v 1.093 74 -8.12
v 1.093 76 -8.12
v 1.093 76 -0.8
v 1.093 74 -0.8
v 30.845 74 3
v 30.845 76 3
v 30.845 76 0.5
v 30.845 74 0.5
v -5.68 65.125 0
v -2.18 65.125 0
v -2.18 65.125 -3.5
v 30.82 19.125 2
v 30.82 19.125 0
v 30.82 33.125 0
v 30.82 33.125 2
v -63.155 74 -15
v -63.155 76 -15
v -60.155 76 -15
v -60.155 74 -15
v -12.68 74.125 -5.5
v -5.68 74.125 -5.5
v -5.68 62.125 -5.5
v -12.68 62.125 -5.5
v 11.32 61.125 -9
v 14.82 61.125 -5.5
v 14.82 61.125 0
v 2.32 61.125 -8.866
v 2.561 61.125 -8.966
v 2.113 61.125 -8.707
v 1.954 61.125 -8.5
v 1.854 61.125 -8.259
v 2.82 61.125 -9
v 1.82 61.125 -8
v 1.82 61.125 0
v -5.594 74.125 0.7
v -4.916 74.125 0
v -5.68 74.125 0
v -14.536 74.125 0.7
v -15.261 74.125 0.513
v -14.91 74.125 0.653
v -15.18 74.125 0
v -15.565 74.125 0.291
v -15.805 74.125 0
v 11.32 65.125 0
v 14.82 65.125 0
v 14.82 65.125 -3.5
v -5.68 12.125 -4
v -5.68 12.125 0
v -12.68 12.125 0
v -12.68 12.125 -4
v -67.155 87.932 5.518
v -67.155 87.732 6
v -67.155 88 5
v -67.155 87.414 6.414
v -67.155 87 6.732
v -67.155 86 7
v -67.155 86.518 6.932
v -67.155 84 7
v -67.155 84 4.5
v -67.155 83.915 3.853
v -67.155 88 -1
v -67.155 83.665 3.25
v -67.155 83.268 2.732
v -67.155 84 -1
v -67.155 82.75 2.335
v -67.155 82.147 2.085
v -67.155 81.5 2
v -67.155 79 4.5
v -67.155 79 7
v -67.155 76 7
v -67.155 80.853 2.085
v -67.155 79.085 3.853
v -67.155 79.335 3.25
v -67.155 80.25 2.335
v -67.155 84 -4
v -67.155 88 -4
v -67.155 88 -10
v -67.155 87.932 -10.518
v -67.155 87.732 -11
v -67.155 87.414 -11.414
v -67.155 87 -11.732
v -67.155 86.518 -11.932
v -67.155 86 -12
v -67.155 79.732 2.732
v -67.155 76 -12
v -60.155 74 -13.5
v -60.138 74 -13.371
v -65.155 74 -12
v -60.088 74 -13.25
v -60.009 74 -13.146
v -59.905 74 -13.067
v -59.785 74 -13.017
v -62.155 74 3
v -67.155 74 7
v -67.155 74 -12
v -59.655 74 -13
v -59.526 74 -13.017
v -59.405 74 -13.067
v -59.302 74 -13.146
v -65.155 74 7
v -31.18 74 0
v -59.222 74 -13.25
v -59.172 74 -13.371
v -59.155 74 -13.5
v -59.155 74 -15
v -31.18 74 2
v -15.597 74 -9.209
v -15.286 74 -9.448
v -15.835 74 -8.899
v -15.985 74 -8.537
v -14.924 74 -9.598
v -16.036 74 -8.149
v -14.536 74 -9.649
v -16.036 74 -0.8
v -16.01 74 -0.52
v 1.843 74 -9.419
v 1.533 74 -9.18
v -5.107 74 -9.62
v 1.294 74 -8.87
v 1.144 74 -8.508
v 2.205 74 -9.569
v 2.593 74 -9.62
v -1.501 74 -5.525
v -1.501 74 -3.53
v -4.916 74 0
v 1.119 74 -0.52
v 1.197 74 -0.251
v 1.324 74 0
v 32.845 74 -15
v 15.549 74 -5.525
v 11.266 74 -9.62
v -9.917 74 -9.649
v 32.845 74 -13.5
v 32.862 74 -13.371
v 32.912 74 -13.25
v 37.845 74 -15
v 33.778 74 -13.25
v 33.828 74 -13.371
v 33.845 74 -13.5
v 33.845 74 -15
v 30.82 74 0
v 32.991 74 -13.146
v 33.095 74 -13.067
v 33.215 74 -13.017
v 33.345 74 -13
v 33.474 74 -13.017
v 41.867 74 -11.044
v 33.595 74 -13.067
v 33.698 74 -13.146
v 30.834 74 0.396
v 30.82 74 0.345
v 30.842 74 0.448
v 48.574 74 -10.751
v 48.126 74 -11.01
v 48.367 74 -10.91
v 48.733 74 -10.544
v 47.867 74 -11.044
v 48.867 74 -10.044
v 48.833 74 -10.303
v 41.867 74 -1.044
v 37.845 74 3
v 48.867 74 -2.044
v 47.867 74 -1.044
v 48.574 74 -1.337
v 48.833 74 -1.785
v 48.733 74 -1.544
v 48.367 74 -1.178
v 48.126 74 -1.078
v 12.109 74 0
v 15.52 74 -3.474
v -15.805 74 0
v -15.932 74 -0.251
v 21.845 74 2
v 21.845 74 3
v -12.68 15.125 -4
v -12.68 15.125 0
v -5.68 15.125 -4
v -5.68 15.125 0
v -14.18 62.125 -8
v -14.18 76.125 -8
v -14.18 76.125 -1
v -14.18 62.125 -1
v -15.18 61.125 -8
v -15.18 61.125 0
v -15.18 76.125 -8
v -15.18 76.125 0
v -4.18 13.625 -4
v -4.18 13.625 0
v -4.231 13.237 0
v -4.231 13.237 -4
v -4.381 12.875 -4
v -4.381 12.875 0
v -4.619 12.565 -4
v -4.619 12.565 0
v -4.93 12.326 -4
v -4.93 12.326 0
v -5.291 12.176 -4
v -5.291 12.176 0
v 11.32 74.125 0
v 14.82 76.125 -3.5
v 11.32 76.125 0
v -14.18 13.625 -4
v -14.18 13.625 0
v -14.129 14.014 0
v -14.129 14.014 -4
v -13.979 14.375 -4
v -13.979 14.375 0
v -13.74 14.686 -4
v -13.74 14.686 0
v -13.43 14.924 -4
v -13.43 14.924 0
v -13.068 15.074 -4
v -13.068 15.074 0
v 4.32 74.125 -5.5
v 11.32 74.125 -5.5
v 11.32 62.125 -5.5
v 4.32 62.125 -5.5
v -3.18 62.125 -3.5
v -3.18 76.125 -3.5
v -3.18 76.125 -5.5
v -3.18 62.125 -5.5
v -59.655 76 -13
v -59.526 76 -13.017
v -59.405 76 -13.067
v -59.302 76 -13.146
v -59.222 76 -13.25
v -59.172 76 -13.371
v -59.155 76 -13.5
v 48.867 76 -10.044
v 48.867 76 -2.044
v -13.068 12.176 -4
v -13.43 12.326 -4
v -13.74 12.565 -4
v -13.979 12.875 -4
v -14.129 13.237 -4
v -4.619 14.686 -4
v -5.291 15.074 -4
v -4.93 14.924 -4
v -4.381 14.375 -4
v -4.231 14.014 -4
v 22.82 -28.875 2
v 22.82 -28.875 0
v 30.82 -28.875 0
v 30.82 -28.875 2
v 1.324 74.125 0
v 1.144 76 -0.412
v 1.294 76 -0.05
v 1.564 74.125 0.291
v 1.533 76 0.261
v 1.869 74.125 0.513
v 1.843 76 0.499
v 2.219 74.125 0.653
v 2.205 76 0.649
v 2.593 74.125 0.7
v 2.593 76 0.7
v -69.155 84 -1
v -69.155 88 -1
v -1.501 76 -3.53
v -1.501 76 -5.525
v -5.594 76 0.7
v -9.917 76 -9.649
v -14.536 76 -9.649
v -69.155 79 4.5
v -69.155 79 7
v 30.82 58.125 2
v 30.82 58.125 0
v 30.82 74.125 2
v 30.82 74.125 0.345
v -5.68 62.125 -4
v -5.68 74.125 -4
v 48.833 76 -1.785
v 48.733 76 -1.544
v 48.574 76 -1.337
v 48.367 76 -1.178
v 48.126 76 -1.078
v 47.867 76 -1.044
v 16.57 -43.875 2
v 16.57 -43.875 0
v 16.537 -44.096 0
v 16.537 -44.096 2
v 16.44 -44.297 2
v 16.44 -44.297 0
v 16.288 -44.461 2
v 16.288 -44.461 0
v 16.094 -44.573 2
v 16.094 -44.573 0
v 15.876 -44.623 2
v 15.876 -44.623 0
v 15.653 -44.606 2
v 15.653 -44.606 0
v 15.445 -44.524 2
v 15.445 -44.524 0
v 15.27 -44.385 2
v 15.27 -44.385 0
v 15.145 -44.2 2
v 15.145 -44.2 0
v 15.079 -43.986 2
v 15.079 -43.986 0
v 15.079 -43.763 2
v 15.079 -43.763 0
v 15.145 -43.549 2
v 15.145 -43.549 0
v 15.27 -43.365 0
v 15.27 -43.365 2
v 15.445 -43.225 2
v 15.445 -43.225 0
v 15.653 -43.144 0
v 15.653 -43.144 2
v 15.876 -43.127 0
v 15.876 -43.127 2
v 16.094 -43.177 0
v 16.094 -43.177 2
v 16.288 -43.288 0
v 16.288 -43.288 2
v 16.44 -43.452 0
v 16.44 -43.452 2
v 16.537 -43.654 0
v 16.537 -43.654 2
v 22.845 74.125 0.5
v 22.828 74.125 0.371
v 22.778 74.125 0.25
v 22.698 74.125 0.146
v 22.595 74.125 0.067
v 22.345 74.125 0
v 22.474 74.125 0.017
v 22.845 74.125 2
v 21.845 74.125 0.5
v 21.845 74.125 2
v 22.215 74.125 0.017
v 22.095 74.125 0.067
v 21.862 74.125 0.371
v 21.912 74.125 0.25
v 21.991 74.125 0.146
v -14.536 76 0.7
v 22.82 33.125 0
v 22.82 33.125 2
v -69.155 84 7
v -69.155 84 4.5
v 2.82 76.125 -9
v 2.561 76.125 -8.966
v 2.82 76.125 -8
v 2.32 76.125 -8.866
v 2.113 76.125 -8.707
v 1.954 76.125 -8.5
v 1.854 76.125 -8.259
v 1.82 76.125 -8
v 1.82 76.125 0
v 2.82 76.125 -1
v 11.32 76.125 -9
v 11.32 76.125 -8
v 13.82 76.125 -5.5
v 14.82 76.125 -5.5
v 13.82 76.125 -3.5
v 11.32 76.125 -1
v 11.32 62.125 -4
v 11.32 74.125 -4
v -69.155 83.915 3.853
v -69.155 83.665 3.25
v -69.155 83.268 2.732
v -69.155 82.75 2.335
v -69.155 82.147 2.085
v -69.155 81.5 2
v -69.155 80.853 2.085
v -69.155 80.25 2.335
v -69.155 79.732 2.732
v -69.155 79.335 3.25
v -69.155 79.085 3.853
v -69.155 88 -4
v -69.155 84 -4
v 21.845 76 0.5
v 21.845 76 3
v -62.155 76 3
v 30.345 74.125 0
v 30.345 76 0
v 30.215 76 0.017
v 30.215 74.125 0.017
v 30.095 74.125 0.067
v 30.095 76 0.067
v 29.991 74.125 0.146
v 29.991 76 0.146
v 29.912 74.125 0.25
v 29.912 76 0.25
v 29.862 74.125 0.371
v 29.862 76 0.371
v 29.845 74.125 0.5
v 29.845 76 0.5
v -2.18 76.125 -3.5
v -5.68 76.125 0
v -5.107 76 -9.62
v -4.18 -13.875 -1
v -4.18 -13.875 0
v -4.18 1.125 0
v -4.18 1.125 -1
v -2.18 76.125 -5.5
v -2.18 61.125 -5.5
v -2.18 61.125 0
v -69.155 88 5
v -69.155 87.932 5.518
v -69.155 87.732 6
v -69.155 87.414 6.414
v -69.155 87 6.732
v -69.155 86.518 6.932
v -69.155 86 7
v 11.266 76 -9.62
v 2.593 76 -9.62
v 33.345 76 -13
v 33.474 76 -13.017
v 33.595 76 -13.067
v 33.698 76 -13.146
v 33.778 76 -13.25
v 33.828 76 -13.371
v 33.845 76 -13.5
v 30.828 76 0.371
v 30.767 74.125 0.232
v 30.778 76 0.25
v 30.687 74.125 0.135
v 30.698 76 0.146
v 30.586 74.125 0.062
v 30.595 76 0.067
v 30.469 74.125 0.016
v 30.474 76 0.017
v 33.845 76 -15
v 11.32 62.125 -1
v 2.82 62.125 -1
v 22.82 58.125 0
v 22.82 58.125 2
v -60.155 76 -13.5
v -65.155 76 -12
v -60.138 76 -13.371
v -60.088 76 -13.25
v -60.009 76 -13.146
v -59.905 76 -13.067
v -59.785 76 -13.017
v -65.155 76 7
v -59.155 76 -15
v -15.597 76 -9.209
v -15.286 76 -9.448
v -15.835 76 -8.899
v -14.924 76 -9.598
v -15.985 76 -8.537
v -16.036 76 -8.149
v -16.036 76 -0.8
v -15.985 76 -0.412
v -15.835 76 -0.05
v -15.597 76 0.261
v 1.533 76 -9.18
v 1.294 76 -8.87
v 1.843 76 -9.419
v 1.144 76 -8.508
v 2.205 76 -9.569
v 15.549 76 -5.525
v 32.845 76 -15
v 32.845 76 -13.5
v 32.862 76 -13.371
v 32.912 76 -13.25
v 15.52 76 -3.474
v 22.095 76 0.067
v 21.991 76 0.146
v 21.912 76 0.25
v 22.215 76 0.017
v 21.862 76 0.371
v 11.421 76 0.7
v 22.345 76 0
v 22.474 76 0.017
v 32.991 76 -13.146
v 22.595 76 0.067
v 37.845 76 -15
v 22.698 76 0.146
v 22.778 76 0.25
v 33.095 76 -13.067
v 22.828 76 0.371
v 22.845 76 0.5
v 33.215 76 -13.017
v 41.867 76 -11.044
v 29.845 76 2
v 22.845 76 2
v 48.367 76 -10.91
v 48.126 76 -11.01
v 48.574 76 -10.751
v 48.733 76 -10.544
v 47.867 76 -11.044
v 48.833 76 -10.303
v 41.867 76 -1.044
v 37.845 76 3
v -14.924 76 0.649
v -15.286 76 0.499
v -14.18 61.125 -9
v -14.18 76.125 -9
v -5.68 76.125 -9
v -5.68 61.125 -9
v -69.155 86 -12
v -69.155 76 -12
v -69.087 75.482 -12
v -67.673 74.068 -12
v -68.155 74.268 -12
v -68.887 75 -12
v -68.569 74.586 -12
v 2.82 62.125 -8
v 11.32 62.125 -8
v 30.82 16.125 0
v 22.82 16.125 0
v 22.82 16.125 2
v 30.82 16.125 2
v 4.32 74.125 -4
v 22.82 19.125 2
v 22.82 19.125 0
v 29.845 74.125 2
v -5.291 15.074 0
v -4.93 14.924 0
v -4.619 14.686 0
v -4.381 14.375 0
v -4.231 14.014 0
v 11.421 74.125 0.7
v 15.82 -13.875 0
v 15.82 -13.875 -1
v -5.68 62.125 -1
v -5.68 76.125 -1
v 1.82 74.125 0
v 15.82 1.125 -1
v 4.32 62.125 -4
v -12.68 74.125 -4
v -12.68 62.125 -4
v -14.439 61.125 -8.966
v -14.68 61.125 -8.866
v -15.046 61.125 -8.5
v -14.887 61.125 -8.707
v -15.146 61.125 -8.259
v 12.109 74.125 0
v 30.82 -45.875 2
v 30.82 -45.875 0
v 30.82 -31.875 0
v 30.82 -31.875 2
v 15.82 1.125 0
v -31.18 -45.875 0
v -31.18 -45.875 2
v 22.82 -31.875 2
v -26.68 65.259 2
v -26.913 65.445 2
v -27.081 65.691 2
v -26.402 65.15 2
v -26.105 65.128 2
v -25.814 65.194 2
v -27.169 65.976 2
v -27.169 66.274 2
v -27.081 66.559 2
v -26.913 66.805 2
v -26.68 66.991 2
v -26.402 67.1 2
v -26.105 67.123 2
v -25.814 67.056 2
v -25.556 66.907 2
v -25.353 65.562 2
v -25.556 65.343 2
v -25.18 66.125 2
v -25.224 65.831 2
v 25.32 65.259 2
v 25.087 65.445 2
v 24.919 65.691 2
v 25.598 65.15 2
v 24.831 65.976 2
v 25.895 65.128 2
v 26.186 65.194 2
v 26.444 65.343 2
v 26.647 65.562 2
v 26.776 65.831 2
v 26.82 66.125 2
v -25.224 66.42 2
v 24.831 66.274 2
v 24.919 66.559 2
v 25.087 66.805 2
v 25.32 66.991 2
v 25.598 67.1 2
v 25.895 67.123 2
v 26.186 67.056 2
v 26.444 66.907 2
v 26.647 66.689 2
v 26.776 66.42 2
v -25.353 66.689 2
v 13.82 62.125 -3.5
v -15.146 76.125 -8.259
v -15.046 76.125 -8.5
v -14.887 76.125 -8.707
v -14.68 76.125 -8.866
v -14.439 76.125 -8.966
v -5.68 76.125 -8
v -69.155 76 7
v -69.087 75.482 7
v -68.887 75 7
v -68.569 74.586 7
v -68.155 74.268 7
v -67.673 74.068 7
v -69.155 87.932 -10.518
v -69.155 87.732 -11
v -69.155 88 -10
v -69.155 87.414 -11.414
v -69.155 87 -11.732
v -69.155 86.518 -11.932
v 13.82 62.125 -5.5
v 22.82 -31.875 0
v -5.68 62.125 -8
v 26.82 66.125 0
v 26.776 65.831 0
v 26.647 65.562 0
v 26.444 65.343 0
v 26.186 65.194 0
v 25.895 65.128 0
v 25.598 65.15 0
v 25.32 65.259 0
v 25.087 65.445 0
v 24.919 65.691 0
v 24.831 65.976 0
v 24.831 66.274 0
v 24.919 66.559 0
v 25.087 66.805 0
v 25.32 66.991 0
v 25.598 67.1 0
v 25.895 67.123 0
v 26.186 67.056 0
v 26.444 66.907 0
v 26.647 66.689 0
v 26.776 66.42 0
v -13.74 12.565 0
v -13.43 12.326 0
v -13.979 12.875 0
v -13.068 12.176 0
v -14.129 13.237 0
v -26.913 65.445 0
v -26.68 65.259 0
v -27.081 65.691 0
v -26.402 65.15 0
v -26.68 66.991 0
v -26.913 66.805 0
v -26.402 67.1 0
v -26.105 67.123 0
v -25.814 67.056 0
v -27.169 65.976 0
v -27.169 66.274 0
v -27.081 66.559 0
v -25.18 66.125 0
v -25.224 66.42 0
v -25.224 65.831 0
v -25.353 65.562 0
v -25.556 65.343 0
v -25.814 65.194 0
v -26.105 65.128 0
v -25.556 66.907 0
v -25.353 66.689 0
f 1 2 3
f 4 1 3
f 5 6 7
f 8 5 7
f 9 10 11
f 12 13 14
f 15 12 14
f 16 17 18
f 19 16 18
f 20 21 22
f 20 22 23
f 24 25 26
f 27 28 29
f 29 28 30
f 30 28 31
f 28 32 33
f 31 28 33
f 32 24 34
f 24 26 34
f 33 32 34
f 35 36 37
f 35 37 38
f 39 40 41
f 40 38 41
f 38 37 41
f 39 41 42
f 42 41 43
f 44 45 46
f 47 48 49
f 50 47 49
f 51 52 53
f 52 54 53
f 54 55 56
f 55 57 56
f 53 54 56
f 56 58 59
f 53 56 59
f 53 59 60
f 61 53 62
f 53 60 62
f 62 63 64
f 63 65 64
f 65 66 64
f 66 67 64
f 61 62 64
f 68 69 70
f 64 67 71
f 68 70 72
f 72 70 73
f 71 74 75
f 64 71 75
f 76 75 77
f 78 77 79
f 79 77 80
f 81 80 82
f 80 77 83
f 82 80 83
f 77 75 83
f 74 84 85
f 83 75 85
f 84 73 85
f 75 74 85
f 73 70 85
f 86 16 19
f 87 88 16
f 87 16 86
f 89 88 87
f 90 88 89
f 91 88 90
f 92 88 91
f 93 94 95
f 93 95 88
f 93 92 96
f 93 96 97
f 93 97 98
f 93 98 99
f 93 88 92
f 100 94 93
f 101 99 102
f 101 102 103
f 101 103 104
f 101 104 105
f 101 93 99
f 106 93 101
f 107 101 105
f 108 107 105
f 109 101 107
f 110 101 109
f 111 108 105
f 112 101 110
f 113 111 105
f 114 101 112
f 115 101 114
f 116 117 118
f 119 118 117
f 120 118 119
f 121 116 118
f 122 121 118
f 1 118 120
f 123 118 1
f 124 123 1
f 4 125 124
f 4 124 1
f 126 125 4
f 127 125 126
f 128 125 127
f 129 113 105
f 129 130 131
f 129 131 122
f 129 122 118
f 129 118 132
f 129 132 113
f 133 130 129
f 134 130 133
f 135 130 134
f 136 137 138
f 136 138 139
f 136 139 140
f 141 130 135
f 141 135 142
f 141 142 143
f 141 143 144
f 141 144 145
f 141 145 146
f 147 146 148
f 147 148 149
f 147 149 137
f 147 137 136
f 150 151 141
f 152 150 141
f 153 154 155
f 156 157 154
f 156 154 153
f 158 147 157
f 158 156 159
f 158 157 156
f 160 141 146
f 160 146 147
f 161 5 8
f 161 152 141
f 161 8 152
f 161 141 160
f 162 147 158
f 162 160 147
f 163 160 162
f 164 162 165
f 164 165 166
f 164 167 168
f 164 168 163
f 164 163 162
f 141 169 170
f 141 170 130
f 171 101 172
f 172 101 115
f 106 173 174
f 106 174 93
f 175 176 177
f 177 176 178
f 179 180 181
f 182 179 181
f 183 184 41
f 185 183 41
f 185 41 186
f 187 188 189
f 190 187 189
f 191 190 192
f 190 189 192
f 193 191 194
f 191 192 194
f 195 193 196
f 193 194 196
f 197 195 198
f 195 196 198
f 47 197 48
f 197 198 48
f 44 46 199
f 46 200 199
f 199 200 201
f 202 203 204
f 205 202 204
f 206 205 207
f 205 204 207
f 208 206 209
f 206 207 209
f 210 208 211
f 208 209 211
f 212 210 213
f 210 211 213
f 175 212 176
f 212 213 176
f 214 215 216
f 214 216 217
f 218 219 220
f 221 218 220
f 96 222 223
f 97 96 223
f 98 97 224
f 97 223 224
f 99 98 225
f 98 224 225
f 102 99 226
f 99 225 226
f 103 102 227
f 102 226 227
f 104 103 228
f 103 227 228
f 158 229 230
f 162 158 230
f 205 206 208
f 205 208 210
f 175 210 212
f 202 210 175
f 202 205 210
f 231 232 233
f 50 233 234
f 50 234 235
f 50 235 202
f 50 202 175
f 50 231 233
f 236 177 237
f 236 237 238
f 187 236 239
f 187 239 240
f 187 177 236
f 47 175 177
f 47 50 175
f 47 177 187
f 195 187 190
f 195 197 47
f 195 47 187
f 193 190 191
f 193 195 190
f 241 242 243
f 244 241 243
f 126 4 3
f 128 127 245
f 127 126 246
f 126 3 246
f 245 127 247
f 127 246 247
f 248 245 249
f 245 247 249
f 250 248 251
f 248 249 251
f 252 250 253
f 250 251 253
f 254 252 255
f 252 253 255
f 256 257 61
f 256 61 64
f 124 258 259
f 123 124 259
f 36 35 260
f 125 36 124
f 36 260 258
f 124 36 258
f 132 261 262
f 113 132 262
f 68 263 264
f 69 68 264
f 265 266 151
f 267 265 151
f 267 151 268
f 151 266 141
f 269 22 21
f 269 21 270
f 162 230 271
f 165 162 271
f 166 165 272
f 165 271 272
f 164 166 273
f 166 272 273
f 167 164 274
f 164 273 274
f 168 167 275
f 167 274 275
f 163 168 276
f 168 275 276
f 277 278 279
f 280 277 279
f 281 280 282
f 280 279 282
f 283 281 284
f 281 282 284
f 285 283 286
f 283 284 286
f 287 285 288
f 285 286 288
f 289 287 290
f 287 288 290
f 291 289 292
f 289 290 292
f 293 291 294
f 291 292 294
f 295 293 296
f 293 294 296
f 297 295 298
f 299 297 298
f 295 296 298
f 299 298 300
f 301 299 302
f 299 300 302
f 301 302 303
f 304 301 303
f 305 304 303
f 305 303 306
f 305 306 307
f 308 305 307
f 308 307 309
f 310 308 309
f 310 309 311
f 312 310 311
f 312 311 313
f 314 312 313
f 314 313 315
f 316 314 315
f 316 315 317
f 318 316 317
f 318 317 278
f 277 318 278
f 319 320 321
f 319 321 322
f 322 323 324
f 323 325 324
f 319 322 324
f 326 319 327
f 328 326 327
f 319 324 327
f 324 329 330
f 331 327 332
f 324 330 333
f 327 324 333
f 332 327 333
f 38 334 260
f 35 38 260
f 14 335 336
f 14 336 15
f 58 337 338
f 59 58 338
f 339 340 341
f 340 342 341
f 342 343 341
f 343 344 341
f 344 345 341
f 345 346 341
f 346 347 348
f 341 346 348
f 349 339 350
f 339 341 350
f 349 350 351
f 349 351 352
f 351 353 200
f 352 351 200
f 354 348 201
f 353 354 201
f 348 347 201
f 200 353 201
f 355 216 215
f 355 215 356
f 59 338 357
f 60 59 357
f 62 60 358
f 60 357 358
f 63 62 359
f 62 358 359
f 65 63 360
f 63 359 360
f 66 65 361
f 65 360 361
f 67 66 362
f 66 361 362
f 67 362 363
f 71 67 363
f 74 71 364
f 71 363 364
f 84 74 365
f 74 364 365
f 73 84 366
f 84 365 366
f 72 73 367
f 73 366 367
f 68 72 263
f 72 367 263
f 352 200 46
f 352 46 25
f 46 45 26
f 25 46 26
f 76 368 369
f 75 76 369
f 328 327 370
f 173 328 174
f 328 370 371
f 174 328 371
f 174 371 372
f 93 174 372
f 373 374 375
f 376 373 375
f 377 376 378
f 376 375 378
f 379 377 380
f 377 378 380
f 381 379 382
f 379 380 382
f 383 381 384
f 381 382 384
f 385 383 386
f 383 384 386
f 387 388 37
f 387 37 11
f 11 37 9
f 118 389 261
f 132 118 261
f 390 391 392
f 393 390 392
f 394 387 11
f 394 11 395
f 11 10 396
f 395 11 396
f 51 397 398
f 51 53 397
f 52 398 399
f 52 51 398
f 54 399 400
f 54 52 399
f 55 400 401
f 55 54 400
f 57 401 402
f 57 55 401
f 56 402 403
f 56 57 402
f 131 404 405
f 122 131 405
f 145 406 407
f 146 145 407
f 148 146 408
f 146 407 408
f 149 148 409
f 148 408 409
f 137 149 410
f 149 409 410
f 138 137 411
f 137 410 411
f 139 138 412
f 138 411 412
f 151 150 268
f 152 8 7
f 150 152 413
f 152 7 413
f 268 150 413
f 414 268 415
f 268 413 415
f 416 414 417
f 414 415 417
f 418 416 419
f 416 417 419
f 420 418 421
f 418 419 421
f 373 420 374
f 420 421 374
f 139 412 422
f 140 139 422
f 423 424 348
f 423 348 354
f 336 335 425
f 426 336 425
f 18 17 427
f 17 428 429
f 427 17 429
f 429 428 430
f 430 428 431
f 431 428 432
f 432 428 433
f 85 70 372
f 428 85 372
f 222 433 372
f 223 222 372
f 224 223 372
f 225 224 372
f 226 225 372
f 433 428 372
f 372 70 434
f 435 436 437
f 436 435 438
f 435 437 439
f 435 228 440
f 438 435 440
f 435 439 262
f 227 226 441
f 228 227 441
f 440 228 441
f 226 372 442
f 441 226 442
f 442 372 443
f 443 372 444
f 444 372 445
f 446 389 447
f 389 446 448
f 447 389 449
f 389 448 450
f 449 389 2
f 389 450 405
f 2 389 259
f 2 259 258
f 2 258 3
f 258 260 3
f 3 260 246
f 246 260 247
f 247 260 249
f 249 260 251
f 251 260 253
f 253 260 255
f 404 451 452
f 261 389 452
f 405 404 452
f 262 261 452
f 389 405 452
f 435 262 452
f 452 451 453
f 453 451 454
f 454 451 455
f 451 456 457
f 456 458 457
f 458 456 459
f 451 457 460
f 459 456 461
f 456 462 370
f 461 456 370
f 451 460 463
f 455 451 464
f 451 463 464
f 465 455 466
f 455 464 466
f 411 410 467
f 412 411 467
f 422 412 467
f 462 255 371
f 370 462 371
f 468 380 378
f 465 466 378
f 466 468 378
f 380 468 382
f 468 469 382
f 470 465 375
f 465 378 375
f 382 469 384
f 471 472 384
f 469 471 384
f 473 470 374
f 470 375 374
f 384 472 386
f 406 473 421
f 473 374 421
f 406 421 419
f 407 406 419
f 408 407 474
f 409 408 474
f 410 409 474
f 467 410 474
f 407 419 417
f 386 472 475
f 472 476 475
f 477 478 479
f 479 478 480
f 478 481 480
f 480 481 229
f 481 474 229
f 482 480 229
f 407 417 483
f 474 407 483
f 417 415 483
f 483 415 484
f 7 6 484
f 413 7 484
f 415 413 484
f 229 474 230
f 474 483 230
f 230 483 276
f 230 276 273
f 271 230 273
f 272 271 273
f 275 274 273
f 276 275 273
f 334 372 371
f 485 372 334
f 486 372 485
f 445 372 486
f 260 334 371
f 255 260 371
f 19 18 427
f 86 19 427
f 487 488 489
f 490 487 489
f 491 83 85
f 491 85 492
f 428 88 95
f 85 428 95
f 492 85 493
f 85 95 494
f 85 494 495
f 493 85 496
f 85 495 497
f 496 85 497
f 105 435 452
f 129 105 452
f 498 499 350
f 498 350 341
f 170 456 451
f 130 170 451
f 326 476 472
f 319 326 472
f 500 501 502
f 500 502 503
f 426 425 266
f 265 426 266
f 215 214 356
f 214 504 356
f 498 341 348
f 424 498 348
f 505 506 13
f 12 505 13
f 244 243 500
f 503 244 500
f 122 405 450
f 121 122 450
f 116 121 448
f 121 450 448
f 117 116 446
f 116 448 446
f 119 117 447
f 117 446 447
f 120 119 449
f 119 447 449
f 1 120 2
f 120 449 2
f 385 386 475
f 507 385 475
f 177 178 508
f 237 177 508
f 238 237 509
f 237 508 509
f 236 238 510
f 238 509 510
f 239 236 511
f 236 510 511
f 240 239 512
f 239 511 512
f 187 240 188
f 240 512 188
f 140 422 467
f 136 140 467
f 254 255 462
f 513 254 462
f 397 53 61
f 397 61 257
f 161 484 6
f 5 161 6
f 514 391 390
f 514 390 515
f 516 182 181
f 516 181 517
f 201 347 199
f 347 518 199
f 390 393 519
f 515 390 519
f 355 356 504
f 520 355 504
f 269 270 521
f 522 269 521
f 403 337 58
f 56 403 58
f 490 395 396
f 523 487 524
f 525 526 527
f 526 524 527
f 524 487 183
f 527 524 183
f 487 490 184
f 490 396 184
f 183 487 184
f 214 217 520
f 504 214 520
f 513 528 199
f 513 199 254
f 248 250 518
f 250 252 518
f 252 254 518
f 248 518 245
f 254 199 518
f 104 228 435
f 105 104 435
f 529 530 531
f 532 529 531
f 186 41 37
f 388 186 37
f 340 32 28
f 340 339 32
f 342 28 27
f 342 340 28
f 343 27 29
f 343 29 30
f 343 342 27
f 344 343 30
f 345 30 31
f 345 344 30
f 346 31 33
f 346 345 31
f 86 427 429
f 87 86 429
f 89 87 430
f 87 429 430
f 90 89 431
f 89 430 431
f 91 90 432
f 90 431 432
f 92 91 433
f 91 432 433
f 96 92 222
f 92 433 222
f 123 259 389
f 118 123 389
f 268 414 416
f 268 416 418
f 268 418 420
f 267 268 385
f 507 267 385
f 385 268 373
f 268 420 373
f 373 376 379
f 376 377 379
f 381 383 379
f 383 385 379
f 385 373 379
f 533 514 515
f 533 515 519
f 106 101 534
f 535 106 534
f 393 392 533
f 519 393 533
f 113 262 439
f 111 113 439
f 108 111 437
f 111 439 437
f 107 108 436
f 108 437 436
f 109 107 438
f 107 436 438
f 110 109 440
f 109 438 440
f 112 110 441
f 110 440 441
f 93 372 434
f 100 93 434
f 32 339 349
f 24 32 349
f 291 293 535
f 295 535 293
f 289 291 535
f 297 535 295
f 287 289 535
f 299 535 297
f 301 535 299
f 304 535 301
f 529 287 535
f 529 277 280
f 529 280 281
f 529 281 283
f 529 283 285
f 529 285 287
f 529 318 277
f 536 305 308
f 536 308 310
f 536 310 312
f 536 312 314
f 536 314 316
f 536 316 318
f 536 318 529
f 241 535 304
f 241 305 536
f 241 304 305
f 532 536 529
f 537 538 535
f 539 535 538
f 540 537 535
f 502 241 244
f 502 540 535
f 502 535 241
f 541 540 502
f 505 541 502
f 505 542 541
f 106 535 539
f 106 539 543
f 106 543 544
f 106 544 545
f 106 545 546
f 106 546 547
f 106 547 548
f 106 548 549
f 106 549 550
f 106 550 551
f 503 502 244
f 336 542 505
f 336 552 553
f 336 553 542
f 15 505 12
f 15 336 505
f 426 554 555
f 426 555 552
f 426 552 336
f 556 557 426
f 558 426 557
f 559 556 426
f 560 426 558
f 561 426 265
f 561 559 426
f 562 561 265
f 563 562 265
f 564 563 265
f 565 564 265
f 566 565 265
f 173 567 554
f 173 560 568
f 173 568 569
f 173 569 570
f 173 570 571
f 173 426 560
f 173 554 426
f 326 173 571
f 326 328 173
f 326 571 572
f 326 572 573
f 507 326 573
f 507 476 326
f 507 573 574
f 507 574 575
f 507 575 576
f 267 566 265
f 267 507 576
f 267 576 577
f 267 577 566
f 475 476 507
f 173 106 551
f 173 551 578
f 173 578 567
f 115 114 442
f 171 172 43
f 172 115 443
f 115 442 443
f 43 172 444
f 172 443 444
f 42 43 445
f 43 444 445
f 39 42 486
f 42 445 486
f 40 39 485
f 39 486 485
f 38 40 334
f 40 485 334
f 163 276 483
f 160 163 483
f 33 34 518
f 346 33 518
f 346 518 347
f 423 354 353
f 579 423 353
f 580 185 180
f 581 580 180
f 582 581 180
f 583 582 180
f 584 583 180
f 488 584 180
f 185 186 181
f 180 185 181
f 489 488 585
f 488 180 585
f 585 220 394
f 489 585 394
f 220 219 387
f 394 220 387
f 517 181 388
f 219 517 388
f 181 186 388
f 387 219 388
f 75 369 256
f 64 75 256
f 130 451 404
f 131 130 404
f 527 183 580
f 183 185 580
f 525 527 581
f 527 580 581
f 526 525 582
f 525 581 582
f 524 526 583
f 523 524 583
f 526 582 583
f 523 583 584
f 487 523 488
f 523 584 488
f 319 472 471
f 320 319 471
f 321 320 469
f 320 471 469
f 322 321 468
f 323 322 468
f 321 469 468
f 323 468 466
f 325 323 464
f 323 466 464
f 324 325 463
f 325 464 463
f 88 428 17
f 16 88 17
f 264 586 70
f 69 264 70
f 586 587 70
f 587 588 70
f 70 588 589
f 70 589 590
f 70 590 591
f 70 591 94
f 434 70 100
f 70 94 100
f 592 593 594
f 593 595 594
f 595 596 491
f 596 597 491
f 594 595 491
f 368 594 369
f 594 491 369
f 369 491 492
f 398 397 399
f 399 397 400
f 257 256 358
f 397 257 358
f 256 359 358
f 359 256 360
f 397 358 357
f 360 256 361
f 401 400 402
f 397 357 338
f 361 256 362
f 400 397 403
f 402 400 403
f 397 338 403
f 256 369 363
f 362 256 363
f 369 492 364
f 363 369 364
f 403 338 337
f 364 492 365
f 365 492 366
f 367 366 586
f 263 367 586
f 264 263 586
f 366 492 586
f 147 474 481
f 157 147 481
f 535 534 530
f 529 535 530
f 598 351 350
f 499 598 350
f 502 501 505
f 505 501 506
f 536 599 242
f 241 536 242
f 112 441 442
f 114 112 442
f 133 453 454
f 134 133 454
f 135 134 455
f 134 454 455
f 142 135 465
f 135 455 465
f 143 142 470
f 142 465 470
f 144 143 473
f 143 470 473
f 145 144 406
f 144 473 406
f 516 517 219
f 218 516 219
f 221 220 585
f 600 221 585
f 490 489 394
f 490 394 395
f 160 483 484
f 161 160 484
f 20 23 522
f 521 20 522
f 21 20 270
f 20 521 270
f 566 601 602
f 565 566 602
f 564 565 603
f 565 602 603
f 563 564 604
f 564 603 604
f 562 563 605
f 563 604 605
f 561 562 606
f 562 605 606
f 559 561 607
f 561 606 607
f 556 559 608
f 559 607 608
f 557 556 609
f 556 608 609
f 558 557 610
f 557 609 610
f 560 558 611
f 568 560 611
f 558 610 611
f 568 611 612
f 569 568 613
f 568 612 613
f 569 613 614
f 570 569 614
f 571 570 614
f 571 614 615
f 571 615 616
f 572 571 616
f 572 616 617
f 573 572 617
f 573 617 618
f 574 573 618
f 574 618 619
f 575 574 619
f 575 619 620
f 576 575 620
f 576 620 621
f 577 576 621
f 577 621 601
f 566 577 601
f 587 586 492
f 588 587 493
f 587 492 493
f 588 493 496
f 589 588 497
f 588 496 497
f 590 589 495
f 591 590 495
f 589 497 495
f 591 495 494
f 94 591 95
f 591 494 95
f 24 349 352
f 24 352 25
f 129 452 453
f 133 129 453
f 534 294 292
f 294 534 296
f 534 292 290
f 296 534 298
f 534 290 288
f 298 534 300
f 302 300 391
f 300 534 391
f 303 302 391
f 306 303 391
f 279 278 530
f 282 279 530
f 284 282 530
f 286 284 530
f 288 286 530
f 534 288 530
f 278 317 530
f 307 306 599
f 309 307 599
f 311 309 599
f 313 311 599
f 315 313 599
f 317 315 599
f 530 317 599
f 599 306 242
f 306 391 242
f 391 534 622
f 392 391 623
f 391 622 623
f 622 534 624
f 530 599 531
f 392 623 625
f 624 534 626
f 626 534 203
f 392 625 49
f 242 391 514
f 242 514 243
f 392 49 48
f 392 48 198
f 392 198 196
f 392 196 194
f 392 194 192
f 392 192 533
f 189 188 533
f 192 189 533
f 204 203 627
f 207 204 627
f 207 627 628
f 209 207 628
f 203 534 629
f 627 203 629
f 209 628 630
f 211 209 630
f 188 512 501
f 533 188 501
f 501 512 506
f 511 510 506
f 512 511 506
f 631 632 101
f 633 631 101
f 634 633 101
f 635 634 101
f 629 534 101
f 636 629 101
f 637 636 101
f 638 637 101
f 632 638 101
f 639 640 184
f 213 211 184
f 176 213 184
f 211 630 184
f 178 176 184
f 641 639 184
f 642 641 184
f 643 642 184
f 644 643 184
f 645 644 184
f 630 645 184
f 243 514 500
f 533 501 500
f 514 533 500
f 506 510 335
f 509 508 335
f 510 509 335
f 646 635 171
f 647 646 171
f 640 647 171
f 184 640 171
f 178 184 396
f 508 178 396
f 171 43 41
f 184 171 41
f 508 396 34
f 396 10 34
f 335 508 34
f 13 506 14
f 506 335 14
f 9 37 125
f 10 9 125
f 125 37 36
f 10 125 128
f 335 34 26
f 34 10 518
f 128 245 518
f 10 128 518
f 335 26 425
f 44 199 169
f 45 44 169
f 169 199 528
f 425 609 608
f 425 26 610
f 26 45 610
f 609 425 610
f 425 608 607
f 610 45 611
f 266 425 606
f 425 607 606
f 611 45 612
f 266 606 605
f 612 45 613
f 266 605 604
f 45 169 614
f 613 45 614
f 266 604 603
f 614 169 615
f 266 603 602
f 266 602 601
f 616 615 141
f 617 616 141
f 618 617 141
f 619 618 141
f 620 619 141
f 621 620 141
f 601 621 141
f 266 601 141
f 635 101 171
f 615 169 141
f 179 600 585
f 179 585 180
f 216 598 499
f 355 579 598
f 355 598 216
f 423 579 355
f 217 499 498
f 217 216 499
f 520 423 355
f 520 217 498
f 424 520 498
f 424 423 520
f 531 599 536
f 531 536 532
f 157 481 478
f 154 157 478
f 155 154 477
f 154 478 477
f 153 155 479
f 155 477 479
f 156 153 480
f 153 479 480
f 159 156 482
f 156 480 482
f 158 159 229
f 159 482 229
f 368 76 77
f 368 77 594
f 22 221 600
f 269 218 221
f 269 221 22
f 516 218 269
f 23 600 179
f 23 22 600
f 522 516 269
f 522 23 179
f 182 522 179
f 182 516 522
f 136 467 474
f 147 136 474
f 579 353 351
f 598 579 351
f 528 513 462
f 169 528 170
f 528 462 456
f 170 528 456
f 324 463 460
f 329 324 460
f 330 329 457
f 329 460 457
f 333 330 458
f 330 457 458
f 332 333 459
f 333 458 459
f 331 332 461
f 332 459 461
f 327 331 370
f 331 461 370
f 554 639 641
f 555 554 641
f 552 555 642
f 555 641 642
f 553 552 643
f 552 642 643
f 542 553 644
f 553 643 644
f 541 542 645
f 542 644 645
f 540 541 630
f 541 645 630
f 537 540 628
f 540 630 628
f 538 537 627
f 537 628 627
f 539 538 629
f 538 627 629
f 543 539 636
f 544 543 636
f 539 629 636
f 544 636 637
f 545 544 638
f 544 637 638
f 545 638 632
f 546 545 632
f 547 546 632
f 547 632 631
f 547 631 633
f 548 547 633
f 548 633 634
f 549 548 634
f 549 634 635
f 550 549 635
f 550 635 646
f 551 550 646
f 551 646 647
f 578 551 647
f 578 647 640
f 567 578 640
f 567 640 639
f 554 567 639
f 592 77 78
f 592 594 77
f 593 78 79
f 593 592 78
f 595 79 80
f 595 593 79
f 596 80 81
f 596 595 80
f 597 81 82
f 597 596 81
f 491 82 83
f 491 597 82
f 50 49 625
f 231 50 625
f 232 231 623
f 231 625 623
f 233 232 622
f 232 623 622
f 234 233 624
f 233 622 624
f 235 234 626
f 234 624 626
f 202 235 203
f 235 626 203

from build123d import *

# Parameters (mm, degrees)
F0_W      = 8
F0_H      = 16
F0_H_2    = 14
F0_H_3    = 45
F1_DEPTH  = 2
F2_W      = 20
F2_H      = 15
F3_DEPTH  = 3
F5_DEPTH  = 4
F6_R      = 0.75
F7_DEPTH  = 25
F8_R      = 1
F9_DEPTH  = 25
F11_DEPTH = 9
F12_SIZE  = 3.5
F13_SIZE  = 3.5
F14_R     = 1
F15_R     = 1
F17_W     = 7
F17_H     = 1.5
F18_DEPTH = 14
F19_DEPTH = 2
F20_W     = 7
F20_H     = 1.5
F21_DEPTH = 14
F22_DEPTH = 2
F24_DEPTH = 9
F26_DEPTH = 9
F29_DEPTH = 2
F31_DEPTH = 12
F32_R     = 2
F33_R     = 2
F34_W     = 4
F34_H     = 3
F35_DEPTH = 25
F37_DEPTH = 25


# Not quite as in the source:
# - two fillets or chamfers of one size are made in one step


with BuildPart() as f1:
    # F0 (on Top) → F1 (new body)
    with BuildSketch(Plane.XY):
        Polygon((22.8202738762, 74.1253000498), (-31.1797261238, 74.1253000498), (-31.1797261238, -45.8746999502), (22.8202738762, -45.8746999502), (22.8202738762, -31.8746999502), (22.8202738762, -28.8746999502), (22.8202738762, 16.1253000498), (22.8202738762, 19.1253000498), (22.8202738762, 33.1253000498), (22.8202738762, 58.1253000498), align=None)
        with Locations((26.8202738762, 66.1253000498)):
            Rectangle(F0_W, F0_H)
        with Locations((26.8202738762, -38.8746999502)):
            Rectangle(F0_W, F0_H_2)
        with Locations((26.8202738762, 26.1253000498)):
            Rectangle(F0_W, F0_H_2)
        with Locations((26.8202738762, -6.3746999502)):
            Rectangle(F0_W, F0_H_3)
    extrude(amount=F1_DEPTH)

    # F2 (on face) → F3 (join)
    with BuildSketch(Plane.XY.offset(2)):
        with Locations((5.8202738762, -6.3746999502)):
            Rectangle(F2_W, F2_H)
    extrude(amount=-F3_DEPTH)

    # F4 (on face) → F5 (join)
    with BuildSketch(Plane(origin=(0, 0, 0), x_dir=(1, 0, 0), z_dir=(0, 0, -1))):
        with BuildLine():
            ThreePointArc((-4.1797261238, -13.6253000498), (-4.619065952, -12.564639878), (-5.6797261238, -12.1253000498))
            Line((-5.6797261238, -12.1253000498), (-12.6797261238, -12.1253000498))
            ThreePointArc((-12.6797261238, -12.1253000498), (-13.7403862956, -12.564639878), (-14.1797261238, -13.6253000498))
            ThreePointArc((-14.1797261238, -13.6253000498), (-13.7403862956, -14.6859602216), (-12.6797261238, -15.1253000498))
            Line((-12.6797261238, -15.1253000498), (-5.6797261238, -15.1253000498))
            ThreePointArc((-5.6797261238, -15.1253000498), (-4.619065952, -14.6859602216), (-4.1797261238, -13.6253000498))
        make_face()
    extrude(amount=F5_DEPTH)

    # F6 (on face) → F7 (cut)
    with BuildSketch(Plane(origin=(0, 0, 0), x_dir=(1, 0, 0), z_dir=(0, 0, -1))):
        with Locations((15.8202738762, 43.8746999502)):
            Circle(F6_R)
    extrude(amount=-F7_DEPTH, mode=Mode.SUBTRACT)

    # F8 (on face) → F9 (cut)
    with BuildSketch(Plane(origin=(0, 0, 0), x_dir=(1, 0, 0), z_dir=(0, 0, -1))):
        with Locations((25.8202738762, -66.1253000498)):
            Circle(F8_R)
        with Locations((-26.1797261238, -66.1253000498)):
            Circle(F8_R)
    extrude(amount=-F9_DEPTH, mode=Mode.SUBTRACT)

    # F10 (on face) → F11 (join)
    with BuildSketch(Plane(origin=(0, 0, 0), x_dir=(1, 0, 0), z_dir=(0, 0, -1))):
        Polygon((14.8202738762, -76.1253000498), (14.8202738762, -74.1253000498), (14.8202738762, -61.1253000498), (1.8202738762, -61.1253000498), (1.8202738762, -74.1253000498), (1.8202738762, -76.1253000498), align=None)
        Polygon((-15.1797261238, -61.1253000498), (-15.1797261238, -74.1253000498), (-15.1797261238, -76.1253000498), (-2.1797261238, -76.1253000498), (-2.1797261238, -74.1253000498), (-2.1797261238, -61.1253000498), align=None)
    extrude(amount=F11_DEPTH)

    # F12
    f12_edges = [f1.edges().sort_by_distance(p)[0] for p in [
        (14.820274, 68.6253, -9),
    ]]
    chamfer(f12_edges, length=F12_SIZE)

    # F13
    f13_edges = [f1.edges().sort_by_distance(p)[0] for p in [
        (14.820274, 75.1253, 0),
        (-2.179726, 75.1253, 0),
        (-2.179726, 68.6253, -9),
    ]]
    chamfer(f13_edges, length=F13_SIZE)

    # F14
    f14_edges = [f1.edges().sort_by_distance(p)[0] for p in [
        (1.820274, 68.6253, -9),
    ]]
    fillet(f14_edges, radius=F14_R)

    # F15
    f15_edges = [f1.edges().sort_by_distance(p)[0] for p in [
        (-15.179726, 68.6253, -9),
    ]]
    fillet(f15_edges, radius=F15_R)

    # F17 (on face) → F18 (cut)
    with BuildSketch(Plane(origin=(0, 76.1253000498, 0), x_dir=(-1, 0, 0), z_dir=(0, 1, 0))):
        Polygon((14.1797261238, -8), (14.1797261238, -1), (5.6797261238, -1), (3.1797261238, -3.5), (3.1797261238, -5.5), (5.6797261238, -8), align=None)
        with Locations((9.1797261238, -4.75)):
            Rectangle(F17_W, F17_H, mode=Mode.SUBTRACT)
    extrude(amount=-F18_DEPTH, mode=Mode.SUBTRACT)

    # F19 (cut): a face of the model
    f19_faces = [f1.faces().sort_by_distance(p)[0] for p in [
        (-9.1797261238, 76.1253000498, -4.75),
    ]]
    extrude(f19_faces, amount=-F19_DEPTH, mode=Mode.SUBTRACT)

    # F20 (on face) → F21 (cut)
    with BuildSketch(Plane(origin=(0, 76.1253000498, 0), x_dir=(-1, 0, 0), z_dir=(0, 1, 0))):
        Polygon((-2.8202738762, -8), (-2.8202738762, -4), (-2.8202738762, -1), (-11.3202738762, -1), (-13.8202738762, -3.5), (-13.8202738762, -5.5), (-11.3202738762, -8), align=None)
        with Locations((-7.8202738762, -4.75)):
            Rectangle(F20_W, F20_H, mode=Mode.SUBTRACT)
    extrude(amount=-F21_DEPTH, mode=Mode.SUBTRACT)

    # F22 (cut): a face of the model
    f22_faces = [f1.faces().sort_by_distance(p)[0] for p in [
        (7.8202738762, 76.1253000498, -4.75),
    ]]
    extrude(f22_faces, amount=-F22_DEPTH, mode=Mode.SUBTRACT)

    # F23 (on face) → F24 (cut)
    with BuildSketch(Plane(origin=(0, 74.1253000498, 0), x_dir=(-1, 0, 0), z_dir=(0, 1, 0))):
        Polygon((-11.3202738762, 0), (-14.8202738762, 0), (-14.8202738762, -3.5), align=None)
    extrude(amount=-F24_DEPTH, mode=Mode.SUBTRACT)

    # F25 (on face) → F26 (cut)
    with BuildSketch(Plane(origin=(0, 74.1253000498, 0), x_dir=(-1, 0, 0), z_dir=(0, 1, 0))):
        Polygon((2.1797261238, -3.5), (5.6797261238, 0), (2.1797261238, 0), align=None)
    extrude(amount=-F26_DEPTH, mode=Mode.SUBTRACT)

    # F28 (on offset) → F29 (join)
    with BuildSketch(Plane.XZ.offset(-76)):
        with BuildLine():
            Line((21.8447855255, 3), (1.8447855255, 3))
            Line((1.8447855255, 3), (0, 3))
            Line((0, 3), (-62.1552144745, 3))
            Line((-62.1552144745, 3), (-65.1552144745, 7))
            Line((-65.1552144745, 7), (-69.1552144745, 7))
            Line((-69.1552144745, 7), (-69.1552144745, -4.8977956176))
            Line((-69.1552144745, -4.8977956176), (-69.1552144745, -12))
            Line((-69.1552144745, -12), (-65.1552144745, -12))
            Line((-65.1552144745, -12), (-63.1552144745, -15))
            Line((-63.1552144745, -15), (-60.1552144745, -15))
            Line((-60.1552144745, -15), (-60.1552144745, -13.5))
            ThreePointArc((-60.1552144745, -13.5), (-60.0087678651, -13.1464466094), (-59.6552144745, -13))
            ThreePointArc((-59.6552144745, -13), (-59.3016610839, -13.1464466094), (-59.1552144745, -13.5))
            Line((-59.1552144745, -13.5), (-59.1552144745, -15))
            Line((-59.1552144745, -15), (32.8447855255, -15))
            Line((32.8447855255, -15), (32.8447855255, -13.5))
            ThreePointArc((32.8447855255, -13.5), (32.9912321349, -13.1464466094), (33.3447855255, -13))
            ThreePointArc((33.3447855255, -13), (33.6983389161, -13.1464466094), (33.8447855255, -13.5))
            Line((33.8447855255, -13.5), (33.8447855255, -15))
            Line((33.8447855255, -15), (37.8447855255, -15))
            Line((37.8447855255, -15), (41.8670170307, -11.0439766385))
            Line((41.8670170307, -11.0439766385), (47.8670170307, -11.0439766385))
            ThreePointArc((47.8670170307, -11.0439766385), (48.5741238119, -10.7510834197), (48.8670170307, -10.0439766385))
            Line((48.8670170307, -10.0439766385), (48.8670170307, -6.0439766385))
            Line((48.8670170307, -6.0439766385), (48.8670170307, -2.0439766385))
            ThreePointArc((48.8670170307, -2.0439766385), (48.5741238119, -1.3368698573), (47.8670170307, -1.0439766385))
            Line((47.8670170307, -1.0439766385), (41.8670170307, -1.0439766385))
            Line((41.8670170307, -1.0439766385), (37.8447855255, 3))
            Line((37.8447855255, 3), (30.8447855255, 3))
            Line((30.8447855255, 3), (30.8447855255, 0.5))
            ThreePointArc((30.8447855255, 0.5), (30.6983389161, 0.1464466094), (30.3447855255, 0))
            ThreePointArc((30.3447855255, 0), (29.9912321349, 0.1464466094), (29.8447855255, 0.5))
            Line((29.8447855255, 0.5), (29.8447855255, 2))
            Line((29.8447855255, 2), (22.8447855255, 2))
            Line((22.8447855255, 2), (22.8447855255, 0.5))
            ThreePointArc((22.8447855255, 0.5), (22.6983389161, 0.1464466094), (22.3447855255, 0))
            ThreePointArc((22.3447855255, 0), (21.9912321349, 0.1464466094), (21.8447855255, 0.5))
            Line((21.8447855255, 0.5), (21.8447855255, 3))
        make_face()
        with BuildLine():
            Line((-5.1067974085, -9.6197371359), (-9.916828014, -9.6487514675))
            Line((-9.916828014, -9.6487514675), (-14.5359628499, -9.6487514675))
            ThreePointArc((-14.5359628499, -9.6487514675), (-15.5966230216, -9.2094116392), (-16.0359628499, -8.1487514675))
            Line((-16.0359628499, -8.1487514675), (-16.0359628499, -4.194740206))
            Line((-16.0359628499, -4.194740206), (-16.0359628499, -0.8))
            ThreePointArc((-16.0359628499, -0.8), (-15.5966230216, 0.2606601718), (-14.5359628499, 0.7))
            Line((-14.5359628499, 0.7), (-9.4512412325, 0.7))
            Line((-9.4512412325, 0.7), (-5.5935280398, 0.7))
            Line((-5.5935280398, 0.7), (-1.5013976704, -3.5296175629))
            Line((-1.5013976704, -3.5296175629), (-1.5013976704, -5.5249878205))
            Line((-1.5013976704, -5.5249878205), (-5.1067974085, -9.6197371359))
        make_face(mode=Mode.SUBTRACT)
        with BuildLine():
            Line((15.5488683626, -5.5253235623), (11.2658282742, -9.6197371359))
            Line((11.2658282742, -9.6197371359), (2.5931737488, -9.6197371359))
            ThreePointArc((2.5931737488, -9.6197371359), (1.532513577, -9.1803973077), (1.0931737488, -8.1197371359))
            Line((1.0931737488, -8.1197371359), (1.0931737488, -4.0044868365))
            Line((1.0931737488, -4.0044868365), (1.0931737488, -0.8))
            ThreePointArc((1.0931737488, -0.8), (1.532513577, 0.2606601718), (2.5931737488, 0.7))
            Line((2.5931737488, 0.7), (7.3360428214, 0.7))
            Line((7.3360428214, 0.7), (11.4213749766, 0.7))
            Line((11.4213749766, 0.7), (15.5199731484, -3.473744262))
            Line((15.5199731484, -3.473744262), (15.5488683626, -5.5253235623))
        make_face(mode=Mode.SUBTRACT)
    extrude(amount=F29_DEPTH)

    # F30 (on face) → F31 (join)
    with BuildSketch(Plane(origin=(0, 76, 0), x_dir=(-1, 0, 0), z_dir=(0, 1, 0))):
        Polygon((67.1552144745, 7), (67.1552144745, -5.6737242267), (67.1552144745, -12), (69.1552144745, -12), (69.1552144745, 7), align=None)
    extrude(amount=F31_DEPTH)

    # F32
    f32_edges = [f1.edges().sort_by_distance(p)[0] for p in [
        (-68.155214, 88, -12),
        (-68.155214, 88, 7),
    ]]
    fillet(f32_edges, radius=F32_R)

    # F33
    f33_edges = [f1.edges().sort_by_distance(p)[0] for p in [
        (-69.155214, 74, -2.5),
    ]]
    fillet(f33_edges, radius=F33_R)

    # F34 (on face) → F35 (cut)
    with BuildSketch(Plane(origin=(-69.1552144745, 0, 0), x_dir=(0, -1, 0), z_dir=(-1, 0, 0))):
        with Locations((-86, -2.5)):
            Rectangle(F34_W, F34_H)
    extrude(amount=-F35_DEPTH, mode=Mode.SUBTRACT)

    # F36 (on face) → F37 (cut)
    with BuildSketch(Plane(origin=(-69.1552144745, 0, 0), x_dir=(0, -1, 0), z_dir=(-1, 0, 0))):
        with BuildLine():
            Line((-79, 7), (-84, 7))
            Line((-84, 7), (-84, 4.5))
            ThreePointArc((-84, 4.5), (-83.267766953, 2.732233047), (-81.5, 2))
            ThreePointArc((-81.5, 2), (-79.732233047, 2.732233047), (-79, 4.5))
            Line((-79, 4.5), (-79, 7))
        make_face()
    extrude(amount=-F37_DEPTH, mode=Mode.SUBTRACT)


solid = f1.part
